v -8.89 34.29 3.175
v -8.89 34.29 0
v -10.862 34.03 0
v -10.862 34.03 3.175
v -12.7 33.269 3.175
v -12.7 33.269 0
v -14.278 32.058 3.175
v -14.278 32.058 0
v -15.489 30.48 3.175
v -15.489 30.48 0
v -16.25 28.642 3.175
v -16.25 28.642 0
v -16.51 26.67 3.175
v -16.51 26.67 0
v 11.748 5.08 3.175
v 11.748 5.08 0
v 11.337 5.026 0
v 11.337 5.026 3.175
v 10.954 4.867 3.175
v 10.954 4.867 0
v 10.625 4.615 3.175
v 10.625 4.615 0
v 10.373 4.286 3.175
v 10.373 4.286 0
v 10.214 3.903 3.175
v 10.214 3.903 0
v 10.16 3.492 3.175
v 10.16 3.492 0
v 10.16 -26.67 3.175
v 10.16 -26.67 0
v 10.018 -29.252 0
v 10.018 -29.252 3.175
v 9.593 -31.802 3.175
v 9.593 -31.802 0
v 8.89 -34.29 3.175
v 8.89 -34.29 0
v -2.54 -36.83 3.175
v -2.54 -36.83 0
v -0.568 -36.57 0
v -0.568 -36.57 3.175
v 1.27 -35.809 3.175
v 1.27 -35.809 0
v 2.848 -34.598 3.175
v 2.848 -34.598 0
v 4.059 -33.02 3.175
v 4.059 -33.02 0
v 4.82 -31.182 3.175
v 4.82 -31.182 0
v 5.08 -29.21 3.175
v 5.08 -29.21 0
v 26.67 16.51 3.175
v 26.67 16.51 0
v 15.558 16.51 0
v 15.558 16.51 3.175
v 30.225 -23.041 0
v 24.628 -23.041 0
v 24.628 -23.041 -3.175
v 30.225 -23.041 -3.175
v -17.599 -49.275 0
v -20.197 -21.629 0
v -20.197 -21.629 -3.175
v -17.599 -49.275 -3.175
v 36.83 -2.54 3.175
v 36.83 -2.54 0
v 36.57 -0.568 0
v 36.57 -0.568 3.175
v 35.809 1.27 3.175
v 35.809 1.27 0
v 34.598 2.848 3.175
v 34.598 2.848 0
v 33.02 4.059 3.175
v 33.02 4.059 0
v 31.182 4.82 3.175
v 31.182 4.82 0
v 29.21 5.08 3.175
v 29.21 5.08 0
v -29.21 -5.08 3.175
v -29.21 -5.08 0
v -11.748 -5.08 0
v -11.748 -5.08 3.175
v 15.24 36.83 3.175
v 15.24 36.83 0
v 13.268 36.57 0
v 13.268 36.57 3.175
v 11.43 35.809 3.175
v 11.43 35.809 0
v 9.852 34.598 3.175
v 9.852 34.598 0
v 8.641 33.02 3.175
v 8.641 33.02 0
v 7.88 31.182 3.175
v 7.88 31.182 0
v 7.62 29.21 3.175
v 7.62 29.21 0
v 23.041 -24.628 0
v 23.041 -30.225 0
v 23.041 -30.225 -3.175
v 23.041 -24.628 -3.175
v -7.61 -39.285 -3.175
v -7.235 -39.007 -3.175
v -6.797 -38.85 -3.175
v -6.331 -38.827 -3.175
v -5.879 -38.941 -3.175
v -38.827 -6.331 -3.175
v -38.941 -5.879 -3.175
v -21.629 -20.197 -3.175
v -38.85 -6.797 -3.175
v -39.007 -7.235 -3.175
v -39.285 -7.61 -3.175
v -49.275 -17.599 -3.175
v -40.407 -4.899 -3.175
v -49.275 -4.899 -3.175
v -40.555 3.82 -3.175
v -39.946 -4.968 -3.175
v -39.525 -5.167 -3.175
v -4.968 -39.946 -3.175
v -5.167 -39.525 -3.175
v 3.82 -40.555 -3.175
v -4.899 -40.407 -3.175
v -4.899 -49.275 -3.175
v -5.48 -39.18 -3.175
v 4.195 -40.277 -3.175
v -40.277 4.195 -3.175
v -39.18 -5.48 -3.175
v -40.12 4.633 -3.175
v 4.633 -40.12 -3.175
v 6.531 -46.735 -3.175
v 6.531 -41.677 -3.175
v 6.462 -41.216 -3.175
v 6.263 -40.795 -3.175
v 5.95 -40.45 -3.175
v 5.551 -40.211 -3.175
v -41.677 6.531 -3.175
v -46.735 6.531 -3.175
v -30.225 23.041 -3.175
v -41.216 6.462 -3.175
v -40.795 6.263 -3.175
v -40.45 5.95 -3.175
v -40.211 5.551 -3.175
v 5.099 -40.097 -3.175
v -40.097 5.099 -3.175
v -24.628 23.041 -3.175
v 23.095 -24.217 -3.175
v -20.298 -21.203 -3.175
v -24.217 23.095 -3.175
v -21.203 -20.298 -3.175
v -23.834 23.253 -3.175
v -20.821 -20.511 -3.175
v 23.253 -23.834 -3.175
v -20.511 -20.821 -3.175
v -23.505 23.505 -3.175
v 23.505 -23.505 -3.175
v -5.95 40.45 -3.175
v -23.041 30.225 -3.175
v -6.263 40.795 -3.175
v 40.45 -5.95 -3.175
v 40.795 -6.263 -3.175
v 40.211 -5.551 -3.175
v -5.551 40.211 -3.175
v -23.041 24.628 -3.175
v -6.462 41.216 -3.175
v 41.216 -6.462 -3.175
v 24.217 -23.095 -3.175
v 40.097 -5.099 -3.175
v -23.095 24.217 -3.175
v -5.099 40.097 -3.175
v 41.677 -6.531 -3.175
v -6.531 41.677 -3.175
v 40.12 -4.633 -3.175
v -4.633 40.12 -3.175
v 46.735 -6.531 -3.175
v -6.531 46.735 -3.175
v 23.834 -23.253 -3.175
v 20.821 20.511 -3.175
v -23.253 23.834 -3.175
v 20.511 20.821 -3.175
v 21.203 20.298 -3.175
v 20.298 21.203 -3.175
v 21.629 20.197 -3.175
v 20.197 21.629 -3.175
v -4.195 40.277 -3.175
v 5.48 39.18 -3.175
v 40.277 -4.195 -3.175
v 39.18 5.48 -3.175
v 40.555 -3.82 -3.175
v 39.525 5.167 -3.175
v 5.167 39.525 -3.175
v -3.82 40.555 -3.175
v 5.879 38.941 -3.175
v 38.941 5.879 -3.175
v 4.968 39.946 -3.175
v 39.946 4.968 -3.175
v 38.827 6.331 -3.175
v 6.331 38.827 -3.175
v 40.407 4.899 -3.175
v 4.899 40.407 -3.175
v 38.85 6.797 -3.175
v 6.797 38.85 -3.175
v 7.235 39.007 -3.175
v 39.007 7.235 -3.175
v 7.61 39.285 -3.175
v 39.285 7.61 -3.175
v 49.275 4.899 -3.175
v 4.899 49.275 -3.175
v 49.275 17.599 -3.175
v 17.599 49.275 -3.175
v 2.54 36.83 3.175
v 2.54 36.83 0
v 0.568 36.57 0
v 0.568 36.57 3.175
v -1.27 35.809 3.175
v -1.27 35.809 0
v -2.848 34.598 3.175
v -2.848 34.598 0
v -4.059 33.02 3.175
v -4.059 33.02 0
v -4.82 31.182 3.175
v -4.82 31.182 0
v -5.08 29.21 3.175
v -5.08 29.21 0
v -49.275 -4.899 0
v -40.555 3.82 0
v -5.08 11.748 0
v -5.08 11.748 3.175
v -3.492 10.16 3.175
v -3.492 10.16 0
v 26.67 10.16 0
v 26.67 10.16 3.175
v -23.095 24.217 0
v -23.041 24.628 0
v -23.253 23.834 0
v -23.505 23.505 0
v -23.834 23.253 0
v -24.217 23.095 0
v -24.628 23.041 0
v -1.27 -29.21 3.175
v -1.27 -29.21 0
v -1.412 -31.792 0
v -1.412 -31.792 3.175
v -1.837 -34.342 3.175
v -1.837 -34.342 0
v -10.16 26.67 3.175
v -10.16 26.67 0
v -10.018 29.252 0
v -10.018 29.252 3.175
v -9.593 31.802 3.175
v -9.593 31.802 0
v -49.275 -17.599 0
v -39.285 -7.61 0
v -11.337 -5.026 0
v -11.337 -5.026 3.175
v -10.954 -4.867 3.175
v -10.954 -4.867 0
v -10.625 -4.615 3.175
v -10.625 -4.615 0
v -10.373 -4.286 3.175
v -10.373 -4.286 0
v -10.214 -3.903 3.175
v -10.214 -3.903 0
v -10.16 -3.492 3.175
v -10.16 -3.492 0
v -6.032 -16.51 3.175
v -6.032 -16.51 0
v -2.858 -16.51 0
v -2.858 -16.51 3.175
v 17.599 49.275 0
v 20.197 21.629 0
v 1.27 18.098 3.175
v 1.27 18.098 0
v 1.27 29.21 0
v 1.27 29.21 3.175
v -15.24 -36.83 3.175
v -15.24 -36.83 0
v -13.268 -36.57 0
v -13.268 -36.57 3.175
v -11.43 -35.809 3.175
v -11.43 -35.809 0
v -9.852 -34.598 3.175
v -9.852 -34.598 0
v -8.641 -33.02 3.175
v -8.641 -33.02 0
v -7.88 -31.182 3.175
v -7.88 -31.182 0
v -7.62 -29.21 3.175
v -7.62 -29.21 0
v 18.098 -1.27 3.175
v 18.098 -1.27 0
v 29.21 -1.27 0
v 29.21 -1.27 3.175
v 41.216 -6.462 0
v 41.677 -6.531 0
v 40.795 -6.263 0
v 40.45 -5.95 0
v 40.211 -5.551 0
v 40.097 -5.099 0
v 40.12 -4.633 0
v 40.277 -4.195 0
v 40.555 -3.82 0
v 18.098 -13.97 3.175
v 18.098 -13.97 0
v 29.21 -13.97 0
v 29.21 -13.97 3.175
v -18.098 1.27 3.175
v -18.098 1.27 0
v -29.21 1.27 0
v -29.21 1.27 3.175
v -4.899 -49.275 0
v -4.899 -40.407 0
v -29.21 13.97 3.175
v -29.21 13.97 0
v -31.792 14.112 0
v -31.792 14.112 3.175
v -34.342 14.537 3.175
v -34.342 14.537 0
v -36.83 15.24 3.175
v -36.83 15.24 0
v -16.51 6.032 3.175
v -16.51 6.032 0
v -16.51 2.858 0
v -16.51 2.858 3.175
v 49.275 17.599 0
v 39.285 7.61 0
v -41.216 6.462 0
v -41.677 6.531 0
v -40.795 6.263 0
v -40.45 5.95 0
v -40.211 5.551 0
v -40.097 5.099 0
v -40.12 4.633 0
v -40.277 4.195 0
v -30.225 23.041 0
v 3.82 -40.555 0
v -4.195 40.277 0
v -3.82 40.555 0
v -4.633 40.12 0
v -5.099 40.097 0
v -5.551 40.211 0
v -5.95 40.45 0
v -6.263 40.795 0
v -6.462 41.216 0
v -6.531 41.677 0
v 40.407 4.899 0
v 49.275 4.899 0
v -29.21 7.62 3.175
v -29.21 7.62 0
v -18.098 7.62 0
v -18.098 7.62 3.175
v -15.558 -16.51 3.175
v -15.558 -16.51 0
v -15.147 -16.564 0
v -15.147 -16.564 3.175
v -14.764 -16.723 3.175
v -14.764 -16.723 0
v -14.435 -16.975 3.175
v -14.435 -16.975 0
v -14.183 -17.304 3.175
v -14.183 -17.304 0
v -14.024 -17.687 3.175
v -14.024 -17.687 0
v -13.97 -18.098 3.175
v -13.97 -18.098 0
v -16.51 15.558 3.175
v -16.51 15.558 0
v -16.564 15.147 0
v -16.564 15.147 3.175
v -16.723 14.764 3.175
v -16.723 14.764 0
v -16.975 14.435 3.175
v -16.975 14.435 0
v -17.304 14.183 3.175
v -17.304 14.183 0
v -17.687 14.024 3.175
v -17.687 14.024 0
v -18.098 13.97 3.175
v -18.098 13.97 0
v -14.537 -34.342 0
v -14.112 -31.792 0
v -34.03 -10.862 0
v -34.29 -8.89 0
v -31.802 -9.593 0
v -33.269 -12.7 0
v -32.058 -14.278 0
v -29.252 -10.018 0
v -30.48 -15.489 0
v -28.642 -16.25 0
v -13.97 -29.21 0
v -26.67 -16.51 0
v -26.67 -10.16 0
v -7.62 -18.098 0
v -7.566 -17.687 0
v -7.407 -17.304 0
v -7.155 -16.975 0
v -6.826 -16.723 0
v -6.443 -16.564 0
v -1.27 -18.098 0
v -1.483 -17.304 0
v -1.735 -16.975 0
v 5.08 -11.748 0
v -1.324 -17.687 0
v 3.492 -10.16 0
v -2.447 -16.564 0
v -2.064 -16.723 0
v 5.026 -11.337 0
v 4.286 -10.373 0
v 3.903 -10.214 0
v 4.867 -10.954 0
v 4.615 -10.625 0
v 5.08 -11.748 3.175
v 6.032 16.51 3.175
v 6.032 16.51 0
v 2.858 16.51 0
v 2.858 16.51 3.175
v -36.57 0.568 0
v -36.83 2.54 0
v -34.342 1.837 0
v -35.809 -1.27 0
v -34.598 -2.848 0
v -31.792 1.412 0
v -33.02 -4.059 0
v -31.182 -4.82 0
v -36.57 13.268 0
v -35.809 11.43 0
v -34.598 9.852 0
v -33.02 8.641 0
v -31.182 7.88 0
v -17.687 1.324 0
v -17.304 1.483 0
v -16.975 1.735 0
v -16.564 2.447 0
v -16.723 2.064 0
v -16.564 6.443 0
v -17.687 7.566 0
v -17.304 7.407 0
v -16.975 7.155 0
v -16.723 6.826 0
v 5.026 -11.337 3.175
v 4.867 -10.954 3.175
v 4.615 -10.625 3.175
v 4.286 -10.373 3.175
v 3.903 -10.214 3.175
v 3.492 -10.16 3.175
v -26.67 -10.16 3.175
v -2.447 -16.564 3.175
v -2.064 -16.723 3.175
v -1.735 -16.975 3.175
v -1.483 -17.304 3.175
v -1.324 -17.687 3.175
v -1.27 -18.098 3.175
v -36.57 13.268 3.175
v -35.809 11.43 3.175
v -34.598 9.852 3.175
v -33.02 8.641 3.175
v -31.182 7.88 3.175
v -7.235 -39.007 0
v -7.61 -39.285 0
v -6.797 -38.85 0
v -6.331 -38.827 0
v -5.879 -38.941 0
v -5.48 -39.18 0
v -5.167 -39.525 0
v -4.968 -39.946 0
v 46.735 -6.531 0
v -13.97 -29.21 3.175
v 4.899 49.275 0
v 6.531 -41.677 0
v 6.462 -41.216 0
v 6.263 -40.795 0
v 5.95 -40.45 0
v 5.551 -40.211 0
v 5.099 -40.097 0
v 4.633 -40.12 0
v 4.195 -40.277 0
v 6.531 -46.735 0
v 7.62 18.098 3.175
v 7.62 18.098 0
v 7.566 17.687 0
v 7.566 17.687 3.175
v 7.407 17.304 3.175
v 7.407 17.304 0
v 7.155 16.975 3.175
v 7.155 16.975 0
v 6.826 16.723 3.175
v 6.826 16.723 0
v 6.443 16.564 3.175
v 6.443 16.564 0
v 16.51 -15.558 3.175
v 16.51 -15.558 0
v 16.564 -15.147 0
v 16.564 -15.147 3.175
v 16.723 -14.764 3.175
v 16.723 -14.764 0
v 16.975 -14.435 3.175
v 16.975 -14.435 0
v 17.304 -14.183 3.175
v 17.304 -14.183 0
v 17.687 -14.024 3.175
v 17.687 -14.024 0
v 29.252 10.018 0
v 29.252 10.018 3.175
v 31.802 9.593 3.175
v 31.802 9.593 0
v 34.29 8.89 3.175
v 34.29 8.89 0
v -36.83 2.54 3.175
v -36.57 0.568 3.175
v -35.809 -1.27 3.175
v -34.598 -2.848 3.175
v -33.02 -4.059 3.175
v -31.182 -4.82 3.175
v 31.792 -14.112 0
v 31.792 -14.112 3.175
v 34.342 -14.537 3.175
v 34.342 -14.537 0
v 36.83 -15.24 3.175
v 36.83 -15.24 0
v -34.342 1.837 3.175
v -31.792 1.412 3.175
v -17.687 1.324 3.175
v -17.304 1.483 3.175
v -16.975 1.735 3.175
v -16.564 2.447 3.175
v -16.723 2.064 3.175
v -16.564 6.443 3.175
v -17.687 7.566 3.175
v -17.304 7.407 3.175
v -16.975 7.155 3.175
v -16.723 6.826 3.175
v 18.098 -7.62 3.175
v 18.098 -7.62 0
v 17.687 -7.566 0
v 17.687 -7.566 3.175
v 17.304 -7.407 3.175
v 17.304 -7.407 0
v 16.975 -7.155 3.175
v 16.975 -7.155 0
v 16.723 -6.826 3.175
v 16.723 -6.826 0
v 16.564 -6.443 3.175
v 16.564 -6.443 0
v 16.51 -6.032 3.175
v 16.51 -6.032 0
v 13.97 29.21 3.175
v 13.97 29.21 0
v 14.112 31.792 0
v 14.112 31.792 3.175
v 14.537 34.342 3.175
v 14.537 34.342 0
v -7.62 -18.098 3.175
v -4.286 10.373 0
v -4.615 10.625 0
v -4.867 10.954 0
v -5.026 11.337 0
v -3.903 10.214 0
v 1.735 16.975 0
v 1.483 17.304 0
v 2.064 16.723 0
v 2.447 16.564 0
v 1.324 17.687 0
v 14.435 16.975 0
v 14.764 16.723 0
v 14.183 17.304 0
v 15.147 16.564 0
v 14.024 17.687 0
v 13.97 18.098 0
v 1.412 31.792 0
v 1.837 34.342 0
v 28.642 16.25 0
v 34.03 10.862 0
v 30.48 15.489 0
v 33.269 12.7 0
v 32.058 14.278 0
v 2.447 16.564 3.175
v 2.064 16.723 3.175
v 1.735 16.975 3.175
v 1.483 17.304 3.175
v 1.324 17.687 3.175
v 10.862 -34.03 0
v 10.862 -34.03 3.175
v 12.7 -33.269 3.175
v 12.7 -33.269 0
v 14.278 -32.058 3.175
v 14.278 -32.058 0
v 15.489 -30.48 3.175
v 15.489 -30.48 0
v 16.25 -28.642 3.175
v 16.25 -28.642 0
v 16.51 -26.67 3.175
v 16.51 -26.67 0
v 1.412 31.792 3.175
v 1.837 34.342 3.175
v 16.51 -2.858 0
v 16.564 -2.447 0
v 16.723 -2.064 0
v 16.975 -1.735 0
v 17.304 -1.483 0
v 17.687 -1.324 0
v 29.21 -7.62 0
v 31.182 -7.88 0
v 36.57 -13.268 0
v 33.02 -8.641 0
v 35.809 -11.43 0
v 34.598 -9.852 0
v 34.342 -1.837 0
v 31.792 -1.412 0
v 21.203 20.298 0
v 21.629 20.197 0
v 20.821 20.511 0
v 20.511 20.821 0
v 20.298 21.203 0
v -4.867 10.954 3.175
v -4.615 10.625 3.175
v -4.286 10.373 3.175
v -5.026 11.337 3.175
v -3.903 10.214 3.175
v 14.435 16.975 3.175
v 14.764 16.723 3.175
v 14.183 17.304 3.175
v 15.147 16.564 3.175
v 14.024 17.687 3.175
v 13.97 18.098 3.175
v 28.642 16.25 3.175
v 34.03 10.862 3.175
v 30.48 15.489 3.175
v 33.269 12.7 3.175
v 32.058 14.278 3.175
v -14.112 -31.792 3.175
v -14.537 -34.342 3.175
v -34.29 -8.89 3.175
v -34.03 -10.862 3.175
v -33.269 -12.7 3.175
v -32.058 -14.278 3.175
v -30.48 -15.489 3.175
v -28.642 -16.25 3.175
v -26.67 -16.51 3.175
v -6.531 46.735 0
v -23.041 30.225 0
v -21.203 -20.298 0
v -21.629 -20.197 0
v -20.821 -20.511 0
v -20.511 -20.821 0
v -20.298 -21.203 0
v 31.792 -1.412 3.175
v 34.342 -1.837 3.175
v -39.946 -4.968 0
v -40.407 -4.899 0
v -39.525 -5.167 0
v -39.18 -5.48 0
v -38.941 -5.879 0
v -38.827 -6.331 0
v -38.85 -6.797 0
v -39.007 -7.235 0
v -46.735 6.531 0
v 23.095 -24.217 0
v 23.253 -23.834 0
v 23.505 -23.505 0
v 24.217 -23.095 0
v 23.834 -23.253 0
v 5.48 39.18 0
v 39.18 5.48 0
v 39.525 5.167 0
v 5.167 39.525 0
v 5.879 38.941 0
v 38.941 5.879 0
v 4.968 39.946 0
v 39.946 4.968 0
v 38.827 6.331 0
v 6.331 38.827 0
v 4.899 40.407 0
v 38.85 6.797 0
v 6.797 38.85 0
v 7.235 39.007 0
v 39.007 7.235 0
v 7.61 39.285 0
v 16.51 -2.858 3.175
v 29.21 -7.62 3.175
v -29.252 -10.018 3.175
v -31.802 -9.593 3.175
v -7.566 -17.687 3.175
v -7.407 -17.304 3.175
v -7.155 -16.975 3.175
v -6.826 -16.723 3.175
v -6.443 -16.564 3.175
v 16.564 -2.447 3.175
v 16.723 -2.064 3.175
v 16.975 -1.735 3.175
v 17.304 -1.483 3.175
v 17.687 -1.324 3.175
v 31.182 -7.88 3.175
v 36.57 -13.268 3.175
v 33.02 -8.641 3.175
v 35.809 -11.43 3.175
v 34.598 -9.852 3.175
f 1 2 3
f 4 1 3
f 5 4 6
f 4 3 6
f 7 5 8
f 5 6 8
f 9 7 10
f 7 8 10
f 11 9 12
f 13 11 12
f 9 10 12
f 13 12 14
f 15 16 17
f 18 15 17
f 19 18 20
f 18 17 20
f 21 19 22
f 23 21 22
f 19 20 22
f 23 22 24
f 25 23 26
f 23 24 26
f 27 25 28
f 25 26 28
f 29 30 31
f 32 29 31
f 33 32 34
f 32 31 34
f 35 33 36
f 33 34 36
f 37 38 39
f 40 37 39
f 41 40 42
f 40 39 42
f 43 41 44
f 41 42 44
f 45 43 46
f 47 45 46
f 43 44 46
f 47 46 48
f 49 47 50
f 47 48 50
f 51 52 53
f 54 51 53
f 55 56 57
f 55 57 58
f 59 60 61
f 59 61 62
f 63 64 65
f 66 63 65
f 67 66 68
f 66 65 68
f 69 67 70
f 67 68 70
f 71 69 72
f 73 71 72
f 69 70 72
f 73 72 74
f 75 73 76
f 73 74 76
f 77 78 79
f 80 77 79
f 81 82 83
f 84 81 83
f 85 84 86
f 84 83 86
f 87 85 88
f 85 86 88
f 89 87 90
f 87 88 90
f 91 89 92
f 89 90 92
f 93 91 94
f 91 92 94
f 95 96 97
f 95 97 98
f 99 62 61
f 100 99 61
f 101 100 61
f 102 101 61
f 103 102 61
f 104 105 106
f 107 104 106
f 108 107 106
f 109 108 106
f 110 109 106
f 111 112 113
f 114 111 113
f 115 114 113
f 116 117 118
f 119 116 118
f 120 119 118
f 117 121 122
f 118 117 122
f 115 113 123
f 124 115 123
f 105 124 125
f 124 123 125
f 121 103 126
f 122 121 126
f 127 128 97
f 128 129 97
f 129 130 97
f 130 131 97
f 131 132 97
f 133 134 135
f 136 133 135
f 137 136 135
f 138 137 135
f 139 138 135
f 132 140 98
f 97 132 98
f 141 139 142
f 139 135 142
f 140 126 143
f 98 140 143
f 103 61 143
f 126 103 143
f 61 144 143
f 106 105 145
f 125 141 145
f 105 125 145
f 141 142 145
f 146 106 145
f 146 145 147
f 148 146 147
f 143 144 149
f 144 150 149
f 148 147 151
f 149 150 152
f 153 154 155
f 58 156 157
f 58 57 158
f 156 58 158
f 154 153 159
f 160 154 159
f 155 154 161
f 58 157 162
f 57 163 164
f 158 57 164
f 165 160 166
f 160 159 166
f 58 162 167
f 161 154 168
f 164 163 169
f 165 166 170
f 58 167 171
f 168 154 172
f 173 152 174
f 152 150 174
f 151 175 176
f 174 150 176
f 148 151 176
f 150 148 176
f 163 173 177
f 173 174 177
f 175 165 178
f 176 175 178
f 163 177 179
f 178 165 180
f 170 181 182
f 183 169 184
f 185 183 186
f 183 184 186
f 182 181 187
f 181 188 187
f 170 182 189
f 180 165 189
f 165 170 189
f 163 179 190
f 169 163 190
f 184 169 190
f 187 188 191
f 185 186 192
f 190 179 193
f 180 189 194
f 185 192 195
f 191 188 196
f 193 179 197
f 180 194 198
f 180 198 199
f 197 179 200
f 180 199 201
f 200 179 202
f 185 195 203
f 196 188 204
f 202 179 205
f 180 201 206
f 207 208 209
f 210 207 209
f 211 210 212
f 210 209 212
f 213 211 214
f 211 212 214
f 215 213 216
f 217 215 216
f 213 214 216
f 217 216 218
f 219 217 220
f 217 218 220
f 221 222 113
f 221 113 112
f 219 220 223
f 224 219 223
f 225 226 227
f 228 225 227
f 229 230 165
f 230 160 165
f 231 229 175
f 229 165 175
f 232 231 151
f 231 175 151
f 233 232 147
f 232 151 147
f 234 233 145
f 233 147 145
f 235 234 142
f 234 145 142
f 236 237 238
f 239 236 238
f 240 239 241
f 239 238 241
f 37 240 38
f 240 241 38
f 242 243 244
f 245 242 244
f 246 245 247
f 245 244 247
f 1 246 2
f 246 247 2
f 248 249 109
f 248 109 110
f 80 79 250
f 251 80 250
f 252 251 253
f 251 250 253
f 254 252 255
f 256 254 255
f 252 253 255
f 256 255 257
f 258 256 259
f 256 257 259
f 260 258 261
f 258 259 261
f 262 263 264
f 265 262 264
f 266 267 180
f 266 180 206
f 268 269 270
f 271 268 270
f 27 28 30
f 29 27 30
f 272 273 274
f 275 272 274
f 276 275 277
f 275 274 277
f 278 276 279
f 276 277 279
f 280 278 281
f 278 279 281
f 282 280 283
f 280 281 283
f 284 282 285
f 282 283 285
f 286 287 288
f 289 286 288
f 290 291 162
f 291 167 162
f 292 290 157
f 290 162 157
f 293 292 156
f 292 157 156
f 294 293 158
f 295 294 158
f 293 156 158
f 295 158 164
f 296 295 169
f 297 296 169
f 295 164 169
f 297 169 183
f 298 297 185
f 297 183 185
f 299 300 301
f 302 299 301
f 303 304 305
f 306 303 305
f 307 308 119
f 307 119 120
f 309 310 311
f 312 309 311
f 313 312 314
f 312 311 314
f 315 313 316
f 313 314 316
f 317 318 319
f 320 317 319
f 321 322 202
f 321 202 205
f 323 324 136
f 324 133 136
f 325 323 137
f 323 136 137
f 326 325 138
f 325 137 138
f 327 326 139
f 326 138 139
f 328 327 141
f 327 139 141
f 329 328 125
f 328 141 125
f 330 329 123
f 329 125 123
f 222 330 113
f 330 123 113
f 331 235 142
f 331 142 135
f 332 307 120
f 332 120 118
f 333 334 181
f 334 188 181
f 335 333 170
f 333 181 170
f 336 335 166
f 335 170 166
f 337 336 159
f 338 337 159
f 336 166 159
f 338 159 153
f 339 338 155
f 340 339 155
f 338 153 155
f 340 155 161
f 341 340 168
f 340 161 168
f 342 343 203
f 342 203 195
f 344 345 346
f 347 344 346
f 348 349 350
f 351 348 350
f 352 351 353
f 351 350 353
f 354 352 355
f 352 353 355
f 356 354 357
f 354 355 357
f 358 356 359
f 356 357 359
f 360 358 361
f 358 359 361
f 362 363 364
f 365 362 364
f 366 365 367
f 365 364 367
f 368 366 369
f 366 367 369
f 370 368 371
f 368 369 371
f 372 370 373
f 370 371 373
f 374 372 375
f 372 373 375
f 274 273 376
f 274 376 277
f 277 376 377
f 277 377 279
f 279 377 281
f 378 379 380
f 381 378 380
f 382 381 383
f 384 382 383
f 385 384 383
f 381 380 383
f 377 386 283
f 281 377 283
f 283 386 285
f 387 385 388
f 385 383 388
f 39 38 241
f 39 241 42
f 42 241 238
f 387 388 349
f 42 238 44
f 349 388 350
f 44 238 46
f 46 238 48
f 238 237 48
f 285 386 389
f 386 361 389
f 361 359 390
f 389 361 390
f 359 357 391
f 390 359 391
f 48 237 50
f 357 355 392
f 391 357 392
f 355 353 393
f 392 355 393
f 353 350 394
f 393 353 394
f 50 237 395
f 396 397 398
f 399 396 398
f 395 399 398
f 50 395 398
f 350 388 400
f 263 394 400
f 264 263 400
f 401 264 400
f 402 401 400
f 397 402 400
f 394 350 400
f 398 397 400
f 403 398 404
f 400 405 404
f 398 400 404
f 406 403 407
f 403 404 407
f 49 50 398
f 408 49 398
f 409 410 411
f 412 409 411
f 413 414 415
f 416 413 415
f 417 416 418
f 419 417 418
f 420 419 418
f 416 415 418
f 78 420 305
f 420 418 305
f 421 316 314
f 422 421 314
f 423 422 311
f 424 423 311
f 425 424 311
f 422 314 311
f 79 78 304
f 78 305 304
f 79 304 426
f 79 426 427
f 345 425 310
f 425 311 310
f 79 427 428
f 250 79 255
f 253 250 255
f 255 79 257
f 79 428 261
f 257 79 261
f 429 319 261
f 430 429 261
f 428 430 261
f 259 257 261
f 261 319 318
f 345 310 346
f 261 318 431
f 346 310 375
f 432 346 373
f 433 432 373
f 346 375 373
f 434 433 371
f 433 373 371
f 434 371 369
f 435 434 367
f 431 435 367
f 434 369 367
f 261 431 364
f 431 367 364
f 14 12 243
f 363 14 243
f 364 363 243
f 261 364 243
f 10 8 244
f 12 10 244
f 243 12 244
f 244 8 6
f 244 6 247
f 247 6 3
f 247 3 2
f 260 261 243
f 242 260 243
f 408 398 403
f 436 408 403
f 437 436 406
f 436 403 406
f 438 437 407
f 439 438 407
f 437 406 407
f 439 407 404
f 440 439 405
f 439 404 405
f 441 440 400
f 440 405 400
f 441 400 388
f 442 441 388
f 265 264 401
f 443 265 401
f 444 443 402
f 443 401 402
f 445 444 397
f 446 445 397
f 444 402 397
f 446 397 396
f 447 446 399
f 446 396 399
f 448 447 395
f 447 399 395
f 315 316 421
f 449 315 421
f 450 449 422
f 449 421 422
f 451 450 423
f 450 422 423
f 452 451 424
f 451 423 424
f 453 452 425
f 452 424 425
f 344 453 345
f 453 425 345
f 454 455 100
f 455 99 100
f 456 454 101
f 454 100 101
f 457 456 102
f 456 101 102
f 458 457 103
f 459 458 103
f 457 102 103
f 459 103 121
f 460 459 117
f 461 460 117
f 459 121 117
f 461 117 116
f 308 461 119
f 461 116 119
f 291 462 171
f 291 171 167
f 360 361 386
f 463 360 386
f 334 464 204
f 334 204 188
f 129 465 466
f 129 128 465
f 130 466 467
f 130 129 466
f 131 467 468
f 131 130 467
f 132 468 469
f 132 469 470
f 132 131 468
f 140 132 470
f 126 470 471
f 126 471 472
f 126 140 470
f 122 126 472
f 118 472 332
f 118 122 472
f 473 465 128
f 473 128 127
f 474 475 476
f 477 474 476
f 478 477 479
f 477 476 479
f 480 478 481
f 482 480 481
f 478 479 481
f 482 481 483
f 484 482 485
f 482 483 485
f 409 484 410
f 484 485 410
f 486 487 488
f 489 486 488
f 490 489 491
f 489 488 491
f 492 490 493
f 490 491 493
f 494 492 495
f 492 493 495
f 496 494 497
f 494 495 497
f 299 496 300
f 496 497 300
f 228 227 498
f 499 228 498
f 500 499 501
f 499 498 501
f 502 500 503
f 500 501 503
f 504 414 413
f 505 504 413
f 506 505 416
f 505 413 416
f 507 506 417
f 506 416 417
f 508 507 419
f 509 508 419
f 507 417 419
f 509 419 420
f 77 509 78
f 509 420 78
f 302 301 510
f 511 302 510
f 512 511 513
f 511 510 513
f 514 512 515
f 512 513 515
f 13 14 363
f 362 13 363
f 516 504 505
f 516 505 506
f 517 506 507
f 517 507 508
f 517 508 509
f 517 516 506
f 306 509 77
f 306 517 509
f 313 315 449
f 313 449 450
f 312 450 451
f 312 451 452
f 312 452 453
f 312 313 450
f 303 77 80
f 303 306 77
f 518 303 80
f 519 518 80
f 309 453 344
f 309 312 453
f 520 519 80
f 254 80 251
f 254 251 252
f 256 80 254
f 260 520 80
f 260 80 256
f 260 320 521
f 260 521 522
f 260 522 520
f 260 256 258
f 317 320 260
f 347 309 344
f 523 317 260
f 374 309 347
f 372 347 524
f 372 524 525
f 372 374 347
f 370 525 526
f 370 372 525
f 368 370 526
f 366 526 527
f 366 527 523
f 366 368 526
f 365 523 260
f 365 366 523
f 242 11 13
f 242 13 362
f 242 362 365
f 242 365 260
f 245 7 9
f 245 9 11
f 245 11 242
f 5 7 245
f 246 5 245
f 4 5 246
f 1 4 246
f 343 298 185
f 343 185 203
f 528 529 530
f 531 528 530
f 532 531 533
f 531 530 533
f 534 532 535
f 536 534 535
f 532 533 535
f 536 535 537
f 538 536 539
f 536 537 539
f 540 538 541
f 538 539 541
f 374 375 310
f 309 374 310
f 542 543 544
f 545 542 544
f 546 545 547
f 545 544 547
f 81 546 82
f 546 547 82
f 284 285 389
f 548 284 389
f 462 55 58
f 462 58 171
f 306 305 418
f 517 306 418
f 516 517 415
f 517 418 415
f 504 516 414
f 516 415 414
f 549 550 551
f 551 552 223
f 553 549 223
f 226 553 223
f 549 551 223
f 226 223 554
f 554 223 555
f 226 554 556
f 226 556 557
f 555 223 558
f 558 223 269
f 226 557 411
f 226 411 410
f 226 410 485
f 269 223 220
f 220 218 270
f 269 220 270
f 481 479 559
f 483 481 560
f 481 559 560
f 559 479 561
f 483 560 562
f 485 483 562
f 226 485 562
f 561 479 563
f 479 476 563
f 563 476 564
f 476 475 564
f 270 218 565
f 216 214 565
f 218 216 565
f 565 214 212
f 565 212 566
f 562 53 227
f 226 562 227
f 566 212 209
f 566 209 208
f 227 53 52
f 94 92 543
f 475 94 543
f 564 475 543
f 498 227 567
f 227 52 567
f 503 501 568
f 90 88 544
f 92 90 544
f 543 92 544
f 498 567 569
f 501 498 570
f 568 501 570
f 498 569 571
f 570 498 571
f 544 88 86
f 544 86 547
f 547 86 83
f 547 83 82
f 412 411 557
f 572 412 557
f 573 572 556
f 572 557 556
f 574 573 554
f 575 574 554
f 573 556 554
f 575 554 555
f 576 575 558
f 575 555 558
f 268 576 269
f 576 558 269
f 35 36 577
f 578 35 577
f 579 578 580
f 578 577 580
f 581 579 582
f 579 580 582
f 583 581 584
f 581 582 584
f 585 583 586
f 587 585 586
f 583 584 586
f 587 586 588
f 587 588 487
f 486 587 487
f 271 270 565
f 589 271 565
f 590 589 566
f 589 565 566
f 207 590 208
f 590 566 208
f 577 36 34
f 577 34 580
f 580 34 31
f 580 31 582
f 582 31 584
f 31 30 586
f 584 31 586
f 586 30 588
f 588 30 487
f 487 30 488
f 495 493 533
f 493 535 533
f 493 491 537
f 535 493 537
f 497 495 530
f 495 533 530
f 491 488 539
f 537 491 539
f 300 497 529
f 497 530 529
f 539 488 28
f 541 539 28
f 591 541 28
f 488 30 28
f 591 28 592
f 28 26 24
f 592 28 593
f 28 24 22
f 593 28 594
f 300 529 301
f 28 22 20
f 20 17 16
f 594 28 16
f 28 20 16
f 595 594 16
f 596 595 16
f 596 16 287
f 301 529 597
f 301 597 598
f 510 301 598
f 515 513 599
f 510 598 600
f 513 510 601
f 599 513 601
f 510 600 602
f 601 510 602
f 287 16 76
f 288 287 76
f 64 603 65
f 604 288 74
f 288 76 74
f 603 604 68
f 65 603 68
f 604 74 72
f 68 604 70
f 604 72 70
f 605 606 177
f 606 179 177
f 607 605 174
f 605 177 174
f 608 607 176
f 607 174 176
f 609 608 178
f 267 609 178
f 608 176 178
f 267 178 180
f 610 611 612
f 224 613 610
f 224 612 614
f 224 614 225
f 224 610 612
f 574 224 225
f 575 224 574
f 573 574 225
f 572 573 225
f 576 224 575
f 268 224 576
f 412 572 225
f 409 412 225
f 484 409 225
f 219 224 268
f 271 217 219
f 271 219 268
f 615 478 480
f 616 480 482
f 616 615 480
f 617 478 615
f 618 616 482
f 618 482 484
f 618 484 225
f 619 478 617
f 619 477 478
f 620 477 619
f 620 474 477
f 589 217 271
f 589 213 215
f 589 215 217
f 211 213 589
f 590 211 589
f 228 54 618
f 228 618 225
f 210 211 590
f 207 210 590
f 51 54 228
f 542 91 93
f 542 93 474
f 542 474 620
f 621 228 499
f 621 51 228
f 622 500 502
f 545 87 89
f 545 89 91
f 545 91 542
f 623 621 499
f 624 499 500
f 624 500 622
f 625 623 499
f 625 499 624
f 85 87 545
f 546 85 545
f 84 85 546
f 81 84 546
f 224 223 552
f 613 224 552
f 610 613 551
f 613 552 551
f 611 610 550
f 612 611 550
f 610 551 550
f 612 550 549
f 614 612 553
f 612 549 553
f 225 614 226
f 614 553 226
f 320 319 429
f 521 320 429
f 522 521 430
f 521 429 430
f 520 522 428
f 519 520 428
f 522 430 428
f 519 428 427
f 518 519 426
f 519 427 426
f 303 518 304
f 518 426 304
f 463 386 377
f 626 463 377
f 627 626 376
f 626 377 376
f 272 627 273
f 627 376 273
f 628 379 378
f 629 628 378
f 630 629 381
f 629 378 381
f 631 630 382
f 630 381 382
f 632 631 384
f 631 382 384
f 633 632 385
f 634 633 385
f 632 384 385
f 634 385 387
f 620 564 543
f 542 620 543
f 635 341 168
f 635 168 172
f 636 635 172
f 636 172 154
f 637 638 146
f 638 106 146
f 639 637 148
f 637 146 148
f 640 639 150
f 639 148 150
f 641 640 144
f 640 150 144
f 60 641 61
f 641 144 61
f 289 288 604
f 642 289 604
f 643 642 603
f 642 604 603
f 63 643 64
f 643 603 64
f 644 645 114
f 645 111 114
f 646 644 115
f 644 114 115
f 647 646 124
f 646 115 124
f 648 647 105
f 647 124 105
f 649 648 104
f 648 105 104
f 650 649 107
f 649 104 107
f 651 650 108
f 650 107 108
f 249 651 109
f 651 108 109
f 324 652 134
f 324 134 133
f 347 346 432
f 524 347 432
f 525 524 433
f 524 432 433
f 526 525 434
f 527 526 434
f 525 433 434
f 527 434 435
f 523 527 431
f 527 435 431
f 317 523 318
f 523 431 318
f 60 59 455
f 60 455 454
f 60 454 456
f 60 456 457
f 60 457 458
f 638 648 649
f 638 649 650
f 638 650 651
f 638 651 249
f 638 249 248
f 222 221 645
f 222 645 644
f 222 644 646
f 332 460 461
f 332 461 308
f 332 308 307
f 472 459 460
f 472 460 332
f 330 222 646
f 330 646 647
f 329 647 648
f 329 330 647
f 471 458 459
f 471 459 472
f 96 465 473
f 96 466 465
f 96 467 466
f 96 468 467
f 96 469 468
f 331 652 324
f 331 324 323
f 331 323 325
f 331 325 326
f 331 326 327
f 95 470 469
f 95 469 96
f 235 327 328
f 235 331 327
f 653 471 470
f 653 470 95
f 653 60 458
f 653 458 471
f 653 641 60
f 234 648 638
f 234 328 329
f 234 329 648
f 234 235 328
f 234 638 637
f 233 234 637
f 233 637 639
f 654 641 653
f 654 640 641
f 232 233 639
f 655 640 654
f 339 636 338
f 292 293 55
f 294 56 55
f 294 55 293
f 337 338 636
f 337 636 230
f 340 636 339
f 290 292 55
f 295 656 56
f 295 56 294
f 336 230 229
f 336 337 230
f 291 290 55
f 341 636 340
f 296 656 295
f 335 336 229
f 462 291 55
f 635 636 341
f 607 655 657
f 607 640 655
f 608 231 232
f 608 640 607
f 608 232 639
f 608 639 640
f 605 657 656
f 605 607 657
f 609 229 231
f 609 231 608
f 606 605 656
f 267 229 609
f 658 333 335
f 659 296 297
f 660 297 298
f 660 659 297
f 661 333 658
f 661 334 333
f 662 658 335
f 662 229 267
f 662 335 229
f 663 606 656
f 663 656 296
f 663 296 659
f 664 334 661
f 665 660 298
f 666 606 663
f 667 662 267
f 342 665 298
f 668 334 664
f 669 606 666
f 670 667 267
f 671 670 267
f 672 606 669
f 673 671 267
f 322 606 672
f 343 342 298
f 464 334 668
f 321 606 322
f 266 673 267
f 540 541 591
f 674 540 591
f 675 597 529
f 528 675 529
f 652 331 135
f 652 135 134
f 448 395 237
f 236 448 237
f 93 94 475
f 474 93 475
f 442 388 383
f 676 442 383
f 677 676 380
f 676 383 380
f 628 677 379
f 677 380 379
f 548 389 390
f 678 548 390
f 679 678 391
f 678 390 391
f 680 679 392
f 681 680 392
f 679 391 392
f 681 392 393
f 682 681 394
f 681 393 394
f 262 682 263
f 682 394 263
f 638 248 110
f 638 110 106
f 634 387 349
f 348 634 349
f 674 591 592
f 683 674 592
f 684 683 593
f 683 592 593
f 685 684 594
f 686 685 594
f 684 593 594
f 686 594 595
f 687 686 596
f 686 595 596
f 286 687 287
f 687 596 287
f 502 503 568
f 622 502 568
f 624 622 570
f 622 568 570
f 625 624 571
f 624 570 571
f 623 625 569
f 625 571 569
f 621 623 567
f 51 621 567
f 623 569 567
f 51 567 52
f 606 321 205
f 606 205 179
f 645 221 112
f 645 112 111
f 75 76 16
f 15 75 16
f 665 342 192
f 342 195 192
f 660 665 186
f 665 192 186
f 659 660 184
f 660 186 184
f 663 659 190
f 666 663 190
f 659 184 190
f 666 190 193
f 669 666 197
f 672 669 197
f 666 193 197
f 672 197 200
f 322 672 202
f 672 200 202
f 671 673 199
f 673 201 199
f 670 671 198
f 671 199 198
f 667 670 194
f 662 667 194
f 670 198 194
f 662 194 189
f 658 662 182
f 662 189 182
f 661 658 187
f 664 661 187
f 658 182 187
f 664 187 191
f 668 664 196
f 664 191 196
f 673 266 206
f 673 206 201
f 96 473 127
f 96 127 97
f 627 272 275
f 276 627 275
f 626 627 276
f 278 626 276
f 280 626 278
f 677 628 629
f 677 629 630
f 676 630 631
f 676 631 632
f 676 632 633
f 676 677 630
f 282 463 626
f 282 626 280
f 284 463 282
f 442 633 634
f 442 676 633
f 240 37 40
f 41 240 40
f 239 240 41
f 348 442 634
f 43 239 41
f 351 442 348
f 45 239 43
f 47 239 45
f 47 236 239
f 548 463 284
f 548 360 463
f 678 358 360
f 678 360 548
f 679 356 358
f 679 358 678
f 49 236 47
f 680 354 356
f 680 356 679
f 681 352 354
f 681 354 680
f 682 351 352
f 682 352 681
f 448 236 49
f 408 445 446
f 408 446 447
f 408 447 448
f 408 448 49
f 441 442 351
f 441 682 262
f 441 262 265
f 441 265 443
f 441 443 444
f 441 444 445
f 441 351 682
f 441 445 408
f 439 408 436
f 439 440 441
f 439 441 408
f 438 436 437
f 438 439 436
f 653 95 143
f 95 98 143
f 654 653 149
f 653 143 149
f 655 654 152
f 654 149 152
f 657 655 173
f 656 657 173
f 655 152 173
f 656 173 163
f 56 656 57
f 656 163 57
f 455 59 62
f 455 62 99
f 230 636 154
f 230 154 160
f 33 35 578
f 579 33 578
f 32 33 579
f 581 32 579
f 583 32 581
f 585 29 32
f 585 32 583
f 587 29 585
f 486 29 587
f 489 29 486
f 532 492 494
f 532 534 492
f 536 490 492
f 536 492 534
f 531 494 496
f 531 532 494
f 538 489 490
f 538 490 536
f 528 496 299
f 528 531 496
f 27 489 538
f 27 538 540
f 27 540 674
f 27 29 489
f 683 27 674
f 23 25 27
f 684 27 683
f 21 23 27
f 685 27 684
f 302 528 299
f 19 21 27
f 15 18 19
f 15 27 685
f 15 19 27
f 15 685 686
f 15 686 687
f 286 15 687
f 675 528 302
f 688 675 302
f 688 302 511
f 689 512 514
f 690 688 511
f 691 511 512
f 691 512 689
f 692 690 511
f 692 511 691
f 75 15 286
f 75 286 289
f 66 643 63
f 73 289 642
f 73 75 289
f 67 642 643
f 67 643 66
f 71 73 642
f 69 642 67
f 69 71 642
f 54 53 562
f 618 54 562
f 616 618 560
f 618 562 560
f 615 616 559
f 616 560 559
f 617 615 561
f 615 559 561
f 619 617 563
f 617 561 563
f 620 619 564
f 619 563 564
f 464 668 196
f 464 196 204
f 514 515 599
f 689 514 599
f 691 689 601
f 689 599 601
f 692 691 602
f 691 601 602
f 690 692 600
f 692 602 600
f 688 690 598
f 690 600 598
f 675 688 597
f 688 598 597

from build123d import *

# Parameters (mm, degrees)
F1_DEPTH = 3.175
F3_DEPTH = 3.175
F4_R     = 1.5875


# Not quite as in the source:
# - a feature names something its author has since deleted; it is built from what else it names


with BuildPart() as f1:
    # F0 (on Top) → F1 (new body)
    with BuildSketch(Plane.XY):
        with BuildLine():
            ThreePointArc((11.7475, 5.08), (10.6249679849, 4.6150320151), (10.16, 3.4925))
            Line((10.16, 3.4925), (10.16, -26.67))
            ThreePointArc((10.16, -26.67), (9.8403252404, -30.5325542067), (8.89, -34.29))
            ThreePointArc((8.89, -34.29), (14.2781536726, -32.0581536726), (16.51, -26.67))
            Line((16.51, -26.67), (16.51, -15.5575))
            ThreePointArc((16.51, -15.5575), (16.9749679849, -14.4349679849), (18.0975, -13.97))
            Line((18.0975, -13.97), (29.21, -13.97))
            ThreePointArc((29.21, -13.97), (33.0725542067, -14.2896747596), (36.83, -15.24))
            ThreePointArc((36.83, -15.24), (34.5981536726, -9.8518463274), (29.21, -7.62))
            Line((29.21, -7.62), (18.0975, -7.62))
            ThreePointArc((18.0975, -7.62), (16.9749679849, -7.1550320151), (16.51, -6.0325))
            Line((16.51, -6.0325), (16.51, -2.8575))
            ThreePointArc((16.51, -2.8575), (16.9749679849, -1.7349679849), (18.0975, -1.27))
            Line((18.0975, -1.27), (29.21, -1.27))
            ThreePointArc((29.21, -1.27), (33.0725542067, -1.5896747596), (36.83, -2.54))
            ThreePointArc((36.83, -2.54), (34.5981536726, 2.8481536726), (29.21, 5.08))
            Line((29.21, 5.08), (11.7475, 5.08))
        make_face()
    extrude(amount=F1_DEPTH)


with BuildPart() as f1b:
    # F0 (on Top) → F1, piece 2 (new body)
    with BuildSketch(Plane.XY):
        with BuildLine():
            ThreePointArc((26.67, 10.16), (30.5325542067, 9.8403252404), (34.29, 8.89))
            ThreePointArc((34.29, 8.89), (32.0581536726, 14.2781536726), (26.67, 16.51))
            Line((26.67, 16.51), (15.5575, 16.51))
            ThreePointArc((15.5575, 16.51), (14.4349679849, 16.9749679849), (13.97, 18.0975))
            Line((13.97, 18.0975), (13.97, 29.21))
            ThreePointArc((13.97, 29.21), (14.2896747596, 33.0725542067), (15.24, 36.83))
            ThreePointArc((15.24, 36.83), (9.8518463274, 34.5981536726), (7.62, 29.21))
            Line((7.62, 29.21), (7.62, 18.0975))
            ThreePointArc((7.62, 18.0975), (7.1550320151, 16.9749679849), (6.0325, 16.51))
            Line((6.0325, 16.51), (2.8575, 16.51))
            ThreePointArc((2.8575, 16.51), (1.7349679849, 16.9749679849), (1.27, 18.0975))
            Line((1.27, 18.0975), (1.27, 29.21))
            ThreePointArc((1.27, 29.21), (1.5896747596, 33.0725542067), (2.54, 36.83))
            ThreePointArc((2.54, 36.83), (-2.8481536726, 34.5981536726), (-5.08, 29.21))
            Line((-5.08, 29.21), (-5.08, 11.7475))
            ThreePointArc((-5.08, 11.7475), (-4.6150320151, 10.6249679849), (-3.4925, 10.16))
            Line((-3.4925, 10.16), (26.67, 10.16))
        make_face()
    extrude(amount=F1_DEPTH)


with BuildPart() as f1c:
    # F0 (on Top) → F1, piece 3 (new body)
    with BuildSketch(Plane.XY):
        with BuildLine():
            ThreePointArc((-10.16, 26.67), (-9.8403252404, 30.5325542067), (-8.89, 34.29))
            ThreePointArc((-8.89, 34.29), (-14.2781536726, 32.0581536726), (-16.51, 26.67))
            Line((-16.51, 26.67), (-16.51, 15.5575))
            ThreePointArc((-16.51, 15.5575), (-16.9749679849, 14.4349679849), (-18.0975, 13.97))
            Line((-18.0975, 13.97), (-29.21, 13.97))
            ThreePointArc((-29.21, 13.97), (-33.0725542067, 14.2896747596), (-36.83, 15.24))
            ThreePointArc((-36.83, 15.24), (-34.5981536726, 9.8518463274), (-29.21, 7.62))
            Line((-29.21, 7.62), (-18.0975, 7.62))
            ThreePointArc((-18.0975, 7.62), (-16.9749679849, 7.1550320151), (-16.51, 6.0325))
            Line((-16.51, 6.0325), (-16.51, 2.8575))
            ThreePointArc((-16.51, 2.8575), (-16.9749679849, 1.7349679849), (-18.0975, 1.27))
            Line((-18.0975, 1.27), (-29.21, 1.27))
            ThreePointArc((-29.21, 1.27), (-33.0725542067, 1.5896747596), (-36.83, 2.54))
            ThreePointArc((-36.83, 2.54), (-34.5981536726, -2.8481536726), (-29.21, -5.08))
            Line((-29.21, -5.08), (-11.7475, -5.08))
            ThreePointArc((-11.7475, -5.08), (-10.6249679849, -4.6150320151), (-10.16, -3.4925))
            Line((-10.16, -3.4925), (-10.16, 26.67))
        make_face()
    extrude(amount=F1_DEPTH)


with BuildPart() as f1d:
    # F0 (on Top) → F1, piece 4 (new body)
    with BuildSketch(Plane.XY):
        with BuildLine():
            ThreePointArc((-26.67, -10.16), (-30.5325542067, -9.8403252404), (-34.29, -8.89))
            ThreePointArc((-34.29, -8.89), (-32.0581536726, -14.2781536726), (-26.67, -16.51))
            Line((-26.67, -16.51), (-15.5575, -16.51))
            ThreePointArc((-15.5575, -16.51), (-14.4349679849, -16.9749679849), (-13.97, -18.0975))
            Line((-13.97, -18.0975), (-13.97, -29.21))
            ThreePointArc((-13.97, -29.21), (-14.2896747596, -33.0725542067), (-15.24, -36.83))
            ThreePointArc((-15.24, -36.83), (-9.8518463274, -34.5981536726), (-7.62, -29.21))
            Line((-7.62, -29.21), (-7.62, -18.0975))
            ThreePointArc((-7.62, -18.0975), (-7.1550320151, -16.9749679849), (-6.0325, -16.51))
            Line((-6.0325, -16.51), (-2.8575, -16.51))
            ThreePointArc((-2.8575, -16.51), (-1.7349679849, -16.9749679849), (-1.27, -18.0975))
            Line((-1.27, -18.0975), (-1.27, -29.21))
            ThreePointArc((-1.27, -29.21), (-1.5896747596, -33.0725542067), (-2.54, -36.83))
            ThreePointArc((-2.54, -36.83), (2.8481536726, -34.5981536726), (5.08, -29.21))
            Line((5.08, -29.21), (5.08, -11.7475))
            ThreePointArc((5.08, -11.7475), (4.6150320151, -10.6249679849), (3.4925, -10.16))
            Line((3.4925, -10.16), (-26.67, -10.16))
        make_face()
    extrude(amount=F1_DEPTH)


with BuildPart() as f3:
    # F2 (on Top) → F3 (new body)
    with BuildSketch(Plane.XY):
        Polygon((6.5305114715, -37.8447175555), (6.5305114715, -46.7347176839), (23.0405122421, -30.2247169133), (23.0405122421, -23.0405122421), (30.2247169133, -23.0405122421), (46.7347176839, -6.5305114715), (37.8447175555, -6.5305114715), (49.2747179408, 4.8994889138), (36.5747179408, 4.8994889138), (49.2747179408, 17.5994889138), (20.3200007064, 20.3200007064), (17.5994889138, 49.2747179408), (4.8994889138, 36.5747179408), (4.8994889138, 49.2747179408), (-6.5305114715, 37.8447175555), (-6.5305114715, 46.7347176839), (-23.0405122421, 30.2247169133), (-23.0405122421, 23.0405122421), (-30.2247169133, 23.0405122421), (-46.7347176839, 6.5305114715), (-37.8447175555, 6.5305114715), (-49.2747179408, -4.8994889138), (-36.5747179408, -4.8994889138), (-49.2747179408, -17.5994889138), (-20.3200007064, -20.3200007064), (-17.5994889138, -49.2747179408), (-4.8994889138, -36.5747179408), (-4.8994889138, -49.2747179408), align=None)
    extrude(amount=-F3_DEPTH)

    # F4
    f4_edges = [f3.edges().sort_by_distance(p)[0] for p in [
        (-37.844718, 6.530511, -1.5875),
        (-36.574718, -4.899489, -1.5875),
        (-23.040512, 23.040512, -1.5875),
        (-6.530511, 37.844718, -1.5875),
        (4.899489, 36.574718, -1.5875),
        (-4.899489, -36.574718, -1.5875),
        (6.530511, -37.844718, -1.5875),
        (23.040512, -23.040512, -1.5875),
        (37.844718, -6.530511, -1.5875),
        (36.574718, 4.899489, -1.5875),
        (20.320001, 20.320001, -1.5875),
        (-20.320001, -20.320001, -1.5875),
    ]]
    fillet(f4_edges, radius=F4_R)


solid = Compound([f1.part, f1b.part, f1c.part, f1d.part, f3.part])
